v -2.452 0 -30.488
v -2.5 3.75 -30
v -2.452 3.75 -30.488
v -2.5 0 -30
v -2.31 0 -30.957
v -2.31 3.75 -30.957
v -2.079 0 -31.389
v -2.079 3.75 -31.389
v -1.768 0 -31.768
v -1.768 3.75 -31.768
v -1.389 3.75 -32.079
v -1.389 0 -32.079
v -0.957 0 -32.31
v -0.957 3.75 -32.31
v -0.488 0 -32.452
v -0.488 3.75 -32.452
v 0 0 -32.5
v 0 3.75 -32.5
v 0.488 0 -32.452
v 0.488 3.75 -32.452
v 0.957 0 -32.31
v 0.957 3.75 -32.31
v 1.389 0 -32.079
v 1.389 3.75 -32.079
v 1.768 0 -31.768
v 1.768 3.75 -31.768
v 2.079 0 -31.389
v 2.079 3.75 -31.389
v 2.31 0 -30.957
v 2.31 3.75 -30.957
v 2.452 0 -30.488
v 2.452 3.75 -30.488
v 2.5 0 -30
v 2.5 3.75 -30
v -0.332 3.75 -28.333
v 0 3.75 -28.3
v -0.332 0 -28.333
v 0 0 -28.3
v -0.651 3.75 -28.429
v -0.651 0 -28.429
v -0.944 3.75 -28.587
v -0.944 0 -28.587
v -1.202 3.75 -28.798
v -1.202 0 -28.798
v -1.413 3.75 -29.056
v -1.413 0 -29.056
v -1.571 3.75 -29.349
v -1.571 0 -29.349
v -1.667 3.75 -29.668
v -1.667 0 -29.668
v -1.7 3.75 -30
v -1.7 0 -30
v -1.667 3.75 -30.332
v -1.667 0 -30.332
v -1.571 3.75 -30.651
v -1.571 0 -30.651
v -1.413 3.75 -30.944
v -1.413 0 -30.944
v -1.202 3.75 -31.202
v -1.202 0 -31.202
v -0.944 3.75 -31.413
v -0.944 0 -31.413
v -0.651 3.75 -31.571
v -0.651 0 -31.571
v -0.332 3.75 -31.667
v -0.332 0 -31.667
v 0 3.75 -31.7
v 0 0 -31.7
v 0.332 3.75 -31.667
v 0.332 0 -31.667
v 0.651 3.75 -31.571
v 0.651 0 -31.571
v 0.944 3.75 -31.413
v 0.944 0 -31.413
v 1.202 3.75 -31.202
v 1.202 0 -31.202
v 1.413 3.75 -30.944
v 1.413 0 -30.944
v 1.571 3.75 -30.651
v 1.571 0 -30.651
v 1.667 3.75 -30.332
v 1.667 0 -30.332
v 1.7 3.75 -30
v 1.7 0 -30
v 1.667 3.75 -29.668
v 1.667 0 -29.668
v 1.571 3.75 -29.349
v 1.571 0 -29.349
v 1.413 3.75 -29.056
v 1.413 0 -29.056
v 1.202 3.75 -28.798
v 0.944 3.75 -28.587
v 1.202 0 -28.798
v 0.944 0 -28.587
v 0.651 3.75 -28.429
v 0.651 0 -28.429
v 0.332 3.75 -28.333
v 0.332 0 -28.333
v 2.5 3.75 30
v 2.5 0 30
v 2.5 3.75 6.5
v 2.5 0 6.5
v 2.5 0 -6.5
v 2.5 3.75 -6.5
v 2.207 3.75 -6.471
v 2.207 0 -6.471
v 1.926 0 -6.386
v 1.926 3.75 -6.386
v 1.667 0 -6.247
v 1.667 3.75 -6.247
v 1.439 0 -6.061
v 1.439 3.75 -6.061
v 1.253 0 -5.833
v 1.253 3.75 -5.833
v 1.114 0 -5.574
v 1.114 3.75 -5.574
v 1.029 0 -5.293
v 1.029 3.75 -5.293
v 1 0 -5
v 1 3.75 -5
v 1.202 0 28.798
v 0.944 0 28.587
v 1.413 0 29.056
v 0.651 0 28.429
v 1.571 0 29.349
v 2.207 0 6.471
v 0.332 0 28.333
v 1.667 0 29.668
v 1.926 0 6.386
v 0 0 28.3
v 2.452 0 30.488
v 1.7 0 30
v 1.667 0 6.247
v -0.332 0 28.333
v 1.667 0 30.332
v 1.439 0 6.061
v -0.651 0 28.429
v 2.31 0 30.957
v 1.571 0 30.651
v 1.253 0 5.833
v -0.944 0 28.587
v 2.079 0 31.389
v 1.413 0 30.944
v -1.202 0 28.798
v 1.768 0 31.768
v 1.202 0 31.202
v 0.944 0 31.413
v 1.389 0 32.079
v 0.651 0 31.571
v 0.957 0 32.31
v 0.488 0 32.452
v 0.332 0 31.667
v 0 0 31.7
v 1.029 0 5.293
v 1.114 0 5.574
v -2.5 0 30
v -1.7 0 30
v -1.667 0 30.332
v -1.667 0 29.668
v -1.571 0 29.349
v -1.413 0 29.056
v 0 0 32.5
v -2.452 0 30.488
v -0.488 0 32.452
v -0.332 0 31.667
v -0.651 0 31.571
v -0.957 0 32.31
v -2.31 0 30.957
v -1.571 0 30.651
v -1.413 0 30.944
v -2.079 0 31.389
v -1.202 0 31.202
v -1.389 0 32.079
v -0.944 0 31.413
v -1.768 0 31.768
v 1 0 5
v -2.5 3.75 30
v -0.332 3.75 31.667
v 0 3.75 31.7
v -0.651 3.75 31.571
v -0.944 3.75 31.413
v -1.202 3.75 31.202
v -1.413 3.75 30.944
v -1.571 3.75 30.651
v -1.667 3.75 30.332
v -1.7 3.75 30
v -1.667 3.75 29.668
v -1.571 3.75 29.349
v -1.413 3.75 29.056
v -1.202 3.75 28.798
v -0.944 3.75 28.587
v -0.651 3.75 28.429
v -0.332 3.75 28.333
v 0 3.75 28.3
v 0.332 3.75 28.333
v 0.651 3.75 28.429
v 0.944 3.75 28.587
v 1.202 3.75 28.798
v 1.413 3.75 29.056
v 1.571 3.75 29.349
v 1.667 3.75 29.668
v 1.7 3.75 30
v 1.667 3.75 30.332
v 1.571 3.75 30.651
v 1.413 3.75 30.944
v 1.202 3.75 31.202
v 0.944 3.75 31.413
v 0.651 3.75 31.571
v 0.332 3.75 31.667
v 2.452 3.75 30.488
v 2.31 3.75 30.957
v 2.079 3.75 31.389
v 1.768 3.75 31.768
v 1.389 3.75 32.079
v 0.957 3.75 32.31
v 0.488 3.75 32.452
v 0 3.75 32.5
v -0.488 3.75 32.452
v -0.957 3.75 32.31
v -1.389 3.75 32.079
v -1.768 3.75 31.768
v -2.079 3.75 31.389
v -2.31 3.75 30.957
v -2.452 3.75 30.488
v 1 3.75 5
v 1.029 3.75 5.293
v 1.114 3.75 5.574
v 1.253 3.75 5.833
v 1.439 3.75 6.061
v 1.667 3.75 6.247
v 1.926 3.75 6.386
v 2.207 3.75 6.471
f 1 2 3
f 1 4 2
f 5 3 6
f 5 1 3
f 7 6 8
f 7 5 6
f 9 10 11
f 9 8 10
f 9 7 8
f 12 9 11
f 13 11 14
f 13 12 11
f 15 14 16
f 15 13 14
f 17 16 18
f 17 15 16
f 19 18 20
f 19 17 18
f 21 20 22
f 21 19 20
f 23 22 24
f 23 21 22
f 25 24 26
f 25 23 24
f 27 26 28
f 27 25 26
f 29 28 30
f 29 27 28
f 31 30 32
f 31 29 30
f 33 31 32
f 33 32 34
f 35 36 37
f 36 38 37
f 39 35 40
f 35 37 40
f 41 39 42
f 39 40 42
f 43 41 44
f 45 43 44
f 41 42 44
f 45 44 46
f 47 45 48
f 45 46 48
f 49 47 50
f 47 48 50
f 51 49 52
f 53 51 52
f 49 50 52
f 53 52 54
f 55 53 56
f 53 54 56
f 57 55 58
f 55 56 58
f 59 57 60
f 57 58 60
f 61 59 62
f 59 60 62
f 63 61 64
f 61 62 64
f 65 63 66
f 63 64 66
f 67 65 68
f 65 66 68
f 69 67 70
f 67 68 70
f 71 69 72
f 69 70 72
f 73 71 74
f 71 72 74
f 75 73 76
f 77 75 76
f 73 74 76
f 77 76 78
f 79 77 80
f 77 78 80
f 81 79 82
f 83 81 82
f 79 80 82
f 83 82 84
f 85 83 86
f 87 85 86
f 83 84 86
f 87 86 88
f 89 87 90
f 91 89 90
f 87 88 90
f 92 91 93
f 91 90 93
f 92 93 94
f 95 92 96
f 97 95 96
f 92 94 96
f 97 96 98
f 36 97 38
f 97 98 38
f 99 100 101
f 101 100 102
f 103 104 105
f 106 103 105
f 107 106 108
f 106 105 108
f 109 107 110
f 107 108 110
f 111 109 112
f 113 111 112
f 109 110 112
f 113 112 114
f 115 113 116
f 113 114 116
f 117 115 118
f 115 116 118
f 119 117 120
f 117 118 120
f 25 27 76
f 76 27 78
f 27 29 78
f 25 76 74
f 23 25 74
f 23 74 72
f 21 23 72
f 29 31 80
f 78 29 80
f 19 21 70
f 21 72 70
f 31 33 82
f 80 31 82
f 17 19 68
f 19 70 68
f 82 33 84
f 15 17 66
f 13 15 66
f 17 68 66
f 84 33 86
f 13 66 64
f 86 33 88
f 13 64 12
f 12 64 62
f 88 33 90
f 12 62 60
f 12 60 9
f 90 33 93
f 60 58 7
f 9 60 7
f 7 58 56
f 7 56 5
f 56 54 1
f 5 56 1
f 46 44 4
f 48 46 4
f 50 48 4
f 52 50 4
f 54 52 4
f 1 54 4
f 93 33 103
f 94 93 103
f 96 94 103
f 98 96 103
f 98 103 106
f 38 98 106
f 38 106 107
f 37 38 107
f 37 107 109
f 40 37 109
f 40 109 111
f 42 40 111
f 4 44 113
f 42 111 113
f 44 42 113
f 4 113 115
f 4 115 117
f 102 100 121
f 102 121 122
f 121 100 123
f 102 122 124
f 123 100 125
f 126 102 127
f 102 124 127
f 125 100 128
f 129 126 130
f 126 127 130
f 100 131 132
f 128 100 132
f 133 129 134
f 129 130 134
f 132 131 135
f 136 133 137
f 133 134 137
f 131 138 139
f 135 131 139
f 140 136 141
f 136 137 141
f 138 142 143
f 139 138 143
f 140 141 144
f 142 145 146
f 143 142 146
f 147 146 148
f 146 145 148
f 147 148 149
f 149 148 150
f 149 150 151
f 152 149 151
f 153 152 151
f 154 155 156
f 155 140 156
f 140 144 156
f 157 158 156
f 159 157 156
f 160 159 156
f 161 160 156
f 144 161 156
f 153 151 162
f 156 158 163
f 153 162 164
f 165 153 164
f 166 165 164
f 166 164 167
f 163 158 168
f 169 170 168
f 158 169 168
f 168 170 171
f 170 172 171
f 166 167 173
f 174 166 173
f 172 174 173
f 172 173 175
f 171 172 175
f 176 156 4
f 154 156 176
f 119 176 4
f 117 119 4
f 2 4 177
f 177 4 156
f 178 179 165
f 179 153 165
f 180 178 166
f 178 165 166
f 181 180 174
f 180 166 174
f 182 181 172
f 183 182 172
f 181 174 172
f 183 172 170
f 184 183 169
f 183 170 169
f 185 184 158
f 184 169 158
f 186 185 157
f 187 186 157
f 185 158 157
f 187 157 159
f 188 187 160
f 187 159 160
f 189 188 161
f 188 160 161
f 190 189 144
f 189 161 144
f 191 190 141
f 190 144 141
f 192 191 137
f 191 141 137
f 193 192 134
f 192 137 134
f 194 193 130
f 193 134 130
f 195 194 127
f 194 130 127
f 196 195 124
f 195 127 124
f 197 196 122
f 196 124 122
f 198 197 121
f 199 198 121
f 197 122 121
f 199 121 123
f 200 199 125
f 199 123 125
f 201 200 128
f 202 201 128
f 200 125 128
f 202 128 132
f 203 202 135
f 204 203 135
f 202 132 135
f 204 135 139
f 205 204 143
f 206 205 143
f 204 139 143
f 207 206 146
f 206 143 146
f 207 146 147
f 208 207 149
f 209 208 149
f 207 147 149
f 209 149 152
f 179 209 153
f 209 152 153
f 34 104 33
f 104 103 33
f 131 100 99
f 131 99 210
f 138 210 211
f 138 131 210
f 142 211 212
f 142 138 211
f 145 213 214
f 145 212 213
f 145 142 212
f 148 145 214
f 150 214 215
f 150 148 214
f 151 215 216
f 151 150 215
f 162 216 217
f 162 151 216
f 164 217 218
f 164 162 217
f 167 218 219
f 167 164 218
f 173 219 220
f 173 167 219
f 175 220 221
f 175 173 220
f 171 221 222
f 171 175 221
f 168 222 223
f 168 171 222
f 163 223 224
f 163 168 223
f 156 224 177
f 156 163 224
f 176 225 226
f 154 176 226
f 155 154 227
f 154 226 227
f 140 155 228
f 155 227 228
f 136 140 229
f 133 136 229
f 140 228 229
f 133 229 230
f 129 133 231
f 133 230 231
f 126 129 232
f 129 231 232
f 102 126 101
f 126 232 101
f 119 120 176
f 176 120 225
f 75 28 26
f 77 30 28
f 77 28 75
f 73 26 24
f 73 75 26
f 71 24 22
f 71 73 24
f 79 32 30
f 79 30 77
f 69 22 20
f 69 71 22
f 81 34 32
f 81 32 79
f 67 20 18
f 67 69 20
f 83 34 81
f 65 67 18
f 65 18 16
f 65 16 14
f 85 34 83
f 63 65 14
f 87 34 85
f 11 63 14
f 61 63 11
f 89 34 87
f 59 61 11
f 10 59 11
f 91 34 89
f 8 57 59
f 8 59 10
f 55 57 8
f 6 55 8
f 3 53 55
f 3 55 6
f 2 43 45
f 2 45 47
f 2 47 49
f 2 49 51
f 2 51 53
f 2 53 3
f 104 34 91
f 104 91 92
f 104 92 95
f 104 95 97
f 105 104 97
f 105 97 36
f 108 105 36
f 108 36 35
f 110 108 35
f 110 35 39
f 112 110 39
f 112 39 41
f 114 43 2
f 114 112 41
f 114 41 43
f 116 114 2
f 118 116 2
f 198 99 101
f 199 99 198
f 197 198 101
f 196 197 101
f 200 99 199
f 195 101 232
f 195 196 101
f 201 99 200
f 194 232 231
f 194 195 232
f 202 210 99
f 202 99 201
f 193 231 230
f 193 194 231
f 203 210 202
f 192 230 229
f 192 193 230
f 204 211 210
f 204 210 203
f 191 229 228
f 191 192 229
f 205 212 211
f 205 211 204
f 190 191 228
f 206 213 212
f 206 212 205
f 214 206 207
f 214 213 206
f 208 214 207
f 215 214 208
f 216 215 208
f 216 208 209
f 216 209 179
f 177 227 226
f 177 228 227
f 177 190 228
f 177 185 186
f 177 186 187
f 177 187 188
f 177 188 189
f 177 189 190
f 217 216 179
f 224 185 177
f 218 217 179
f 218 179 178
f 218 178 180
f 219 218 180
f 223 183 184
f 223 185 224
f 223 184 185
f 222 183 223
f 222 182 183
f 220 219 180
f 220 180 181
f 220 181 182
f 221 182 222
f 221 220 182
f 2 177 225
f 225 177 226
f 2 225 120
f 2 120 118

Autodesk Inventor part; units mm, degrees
ref_plane "YZ Plane" through (0, 0, 0) normal (1, 0, 0) x (0, 1, 0)
ref_plane "XZ Plane" through (0, 0, 0) normal (0, 1, 0) x (-1, 0, 0)
ref_plane "XY Plane" through (0, 0, 0) normal (0, 0, 1) x (1, 0, 0)
sketch "Sketch1" plane through (0, 0, 0) normal (0, 1, 0) x (-1, 0, 0)
  line L0 (0, 30) -> (0, -30) construction
  line L1 (-2.5, 30) -> (-2.5, -30)
  line L2 (2.5, -30) -> (2.5, 30)
  arc A0 (2.5, 30) -> (-2.5, 30) centre (0, 30) ccw
  arc A1 (-2.5, -30) -> (2.5, -30) centre (0, -30) ccw
  point P0 (0, 0)
  point P1 (0, 0)
  dimension "d0" = 60
  dimension "d1" = 5
extrude "Extrusion1" add sketch "Sketch1" along normal blind 3.75
sketch "Sketch2" plane through (0, 3.75, 0) normal (0, 1, 0) x (1, 0, 0)
  arc A0 (2.5, 30) -> (-2.5, 30) centre (0, 30) ccw projected
  line L0 (-2.5, 30) -> (-2.5, -30) projected
  arc A1 (-2.5, -30) -> (2.5, -30) centre (0, -30) ccw projected
  line L1 (2.5, -30) -> (2.5, 30) projected
  point P0 (0, 0)
hole "Hole1" at (0, 3.75, 30) at (0, 3.75, -30) direction (0, -1, 0) diameter 3.4 end through all
sketch "Sketch3" plane through (0, 3.75, 0) normal (0, 1, 0) x (1, 0, 0)
  line L0 (2.5, 5) -> (2.5, -5) construction
  line L1 (2.5, -30) -> (2.5, 30) projected
  line L2 (1, 5) -> (1, -5)
  line L3 (4, -5) -> (4, 5)
  arc A0 (4, 5) -> (1, 5) centre (2.5, 5) ccw
  arc A1 (1, -5) -> (4, -5) centre (2.5, -5) ccw
  point P0 (0, 0)
  point P1 (2.5, 0)
  point P2 (2.5, -6.5)
  point P3 (2.5, 6.5)
  dimension "d11" = 5
  dimension "d12" = 3
extrude "Extrusion2" cut sketch "Sketch3" against normal through all contours A1 L2 A0 L1
properties part number "MainLink"
